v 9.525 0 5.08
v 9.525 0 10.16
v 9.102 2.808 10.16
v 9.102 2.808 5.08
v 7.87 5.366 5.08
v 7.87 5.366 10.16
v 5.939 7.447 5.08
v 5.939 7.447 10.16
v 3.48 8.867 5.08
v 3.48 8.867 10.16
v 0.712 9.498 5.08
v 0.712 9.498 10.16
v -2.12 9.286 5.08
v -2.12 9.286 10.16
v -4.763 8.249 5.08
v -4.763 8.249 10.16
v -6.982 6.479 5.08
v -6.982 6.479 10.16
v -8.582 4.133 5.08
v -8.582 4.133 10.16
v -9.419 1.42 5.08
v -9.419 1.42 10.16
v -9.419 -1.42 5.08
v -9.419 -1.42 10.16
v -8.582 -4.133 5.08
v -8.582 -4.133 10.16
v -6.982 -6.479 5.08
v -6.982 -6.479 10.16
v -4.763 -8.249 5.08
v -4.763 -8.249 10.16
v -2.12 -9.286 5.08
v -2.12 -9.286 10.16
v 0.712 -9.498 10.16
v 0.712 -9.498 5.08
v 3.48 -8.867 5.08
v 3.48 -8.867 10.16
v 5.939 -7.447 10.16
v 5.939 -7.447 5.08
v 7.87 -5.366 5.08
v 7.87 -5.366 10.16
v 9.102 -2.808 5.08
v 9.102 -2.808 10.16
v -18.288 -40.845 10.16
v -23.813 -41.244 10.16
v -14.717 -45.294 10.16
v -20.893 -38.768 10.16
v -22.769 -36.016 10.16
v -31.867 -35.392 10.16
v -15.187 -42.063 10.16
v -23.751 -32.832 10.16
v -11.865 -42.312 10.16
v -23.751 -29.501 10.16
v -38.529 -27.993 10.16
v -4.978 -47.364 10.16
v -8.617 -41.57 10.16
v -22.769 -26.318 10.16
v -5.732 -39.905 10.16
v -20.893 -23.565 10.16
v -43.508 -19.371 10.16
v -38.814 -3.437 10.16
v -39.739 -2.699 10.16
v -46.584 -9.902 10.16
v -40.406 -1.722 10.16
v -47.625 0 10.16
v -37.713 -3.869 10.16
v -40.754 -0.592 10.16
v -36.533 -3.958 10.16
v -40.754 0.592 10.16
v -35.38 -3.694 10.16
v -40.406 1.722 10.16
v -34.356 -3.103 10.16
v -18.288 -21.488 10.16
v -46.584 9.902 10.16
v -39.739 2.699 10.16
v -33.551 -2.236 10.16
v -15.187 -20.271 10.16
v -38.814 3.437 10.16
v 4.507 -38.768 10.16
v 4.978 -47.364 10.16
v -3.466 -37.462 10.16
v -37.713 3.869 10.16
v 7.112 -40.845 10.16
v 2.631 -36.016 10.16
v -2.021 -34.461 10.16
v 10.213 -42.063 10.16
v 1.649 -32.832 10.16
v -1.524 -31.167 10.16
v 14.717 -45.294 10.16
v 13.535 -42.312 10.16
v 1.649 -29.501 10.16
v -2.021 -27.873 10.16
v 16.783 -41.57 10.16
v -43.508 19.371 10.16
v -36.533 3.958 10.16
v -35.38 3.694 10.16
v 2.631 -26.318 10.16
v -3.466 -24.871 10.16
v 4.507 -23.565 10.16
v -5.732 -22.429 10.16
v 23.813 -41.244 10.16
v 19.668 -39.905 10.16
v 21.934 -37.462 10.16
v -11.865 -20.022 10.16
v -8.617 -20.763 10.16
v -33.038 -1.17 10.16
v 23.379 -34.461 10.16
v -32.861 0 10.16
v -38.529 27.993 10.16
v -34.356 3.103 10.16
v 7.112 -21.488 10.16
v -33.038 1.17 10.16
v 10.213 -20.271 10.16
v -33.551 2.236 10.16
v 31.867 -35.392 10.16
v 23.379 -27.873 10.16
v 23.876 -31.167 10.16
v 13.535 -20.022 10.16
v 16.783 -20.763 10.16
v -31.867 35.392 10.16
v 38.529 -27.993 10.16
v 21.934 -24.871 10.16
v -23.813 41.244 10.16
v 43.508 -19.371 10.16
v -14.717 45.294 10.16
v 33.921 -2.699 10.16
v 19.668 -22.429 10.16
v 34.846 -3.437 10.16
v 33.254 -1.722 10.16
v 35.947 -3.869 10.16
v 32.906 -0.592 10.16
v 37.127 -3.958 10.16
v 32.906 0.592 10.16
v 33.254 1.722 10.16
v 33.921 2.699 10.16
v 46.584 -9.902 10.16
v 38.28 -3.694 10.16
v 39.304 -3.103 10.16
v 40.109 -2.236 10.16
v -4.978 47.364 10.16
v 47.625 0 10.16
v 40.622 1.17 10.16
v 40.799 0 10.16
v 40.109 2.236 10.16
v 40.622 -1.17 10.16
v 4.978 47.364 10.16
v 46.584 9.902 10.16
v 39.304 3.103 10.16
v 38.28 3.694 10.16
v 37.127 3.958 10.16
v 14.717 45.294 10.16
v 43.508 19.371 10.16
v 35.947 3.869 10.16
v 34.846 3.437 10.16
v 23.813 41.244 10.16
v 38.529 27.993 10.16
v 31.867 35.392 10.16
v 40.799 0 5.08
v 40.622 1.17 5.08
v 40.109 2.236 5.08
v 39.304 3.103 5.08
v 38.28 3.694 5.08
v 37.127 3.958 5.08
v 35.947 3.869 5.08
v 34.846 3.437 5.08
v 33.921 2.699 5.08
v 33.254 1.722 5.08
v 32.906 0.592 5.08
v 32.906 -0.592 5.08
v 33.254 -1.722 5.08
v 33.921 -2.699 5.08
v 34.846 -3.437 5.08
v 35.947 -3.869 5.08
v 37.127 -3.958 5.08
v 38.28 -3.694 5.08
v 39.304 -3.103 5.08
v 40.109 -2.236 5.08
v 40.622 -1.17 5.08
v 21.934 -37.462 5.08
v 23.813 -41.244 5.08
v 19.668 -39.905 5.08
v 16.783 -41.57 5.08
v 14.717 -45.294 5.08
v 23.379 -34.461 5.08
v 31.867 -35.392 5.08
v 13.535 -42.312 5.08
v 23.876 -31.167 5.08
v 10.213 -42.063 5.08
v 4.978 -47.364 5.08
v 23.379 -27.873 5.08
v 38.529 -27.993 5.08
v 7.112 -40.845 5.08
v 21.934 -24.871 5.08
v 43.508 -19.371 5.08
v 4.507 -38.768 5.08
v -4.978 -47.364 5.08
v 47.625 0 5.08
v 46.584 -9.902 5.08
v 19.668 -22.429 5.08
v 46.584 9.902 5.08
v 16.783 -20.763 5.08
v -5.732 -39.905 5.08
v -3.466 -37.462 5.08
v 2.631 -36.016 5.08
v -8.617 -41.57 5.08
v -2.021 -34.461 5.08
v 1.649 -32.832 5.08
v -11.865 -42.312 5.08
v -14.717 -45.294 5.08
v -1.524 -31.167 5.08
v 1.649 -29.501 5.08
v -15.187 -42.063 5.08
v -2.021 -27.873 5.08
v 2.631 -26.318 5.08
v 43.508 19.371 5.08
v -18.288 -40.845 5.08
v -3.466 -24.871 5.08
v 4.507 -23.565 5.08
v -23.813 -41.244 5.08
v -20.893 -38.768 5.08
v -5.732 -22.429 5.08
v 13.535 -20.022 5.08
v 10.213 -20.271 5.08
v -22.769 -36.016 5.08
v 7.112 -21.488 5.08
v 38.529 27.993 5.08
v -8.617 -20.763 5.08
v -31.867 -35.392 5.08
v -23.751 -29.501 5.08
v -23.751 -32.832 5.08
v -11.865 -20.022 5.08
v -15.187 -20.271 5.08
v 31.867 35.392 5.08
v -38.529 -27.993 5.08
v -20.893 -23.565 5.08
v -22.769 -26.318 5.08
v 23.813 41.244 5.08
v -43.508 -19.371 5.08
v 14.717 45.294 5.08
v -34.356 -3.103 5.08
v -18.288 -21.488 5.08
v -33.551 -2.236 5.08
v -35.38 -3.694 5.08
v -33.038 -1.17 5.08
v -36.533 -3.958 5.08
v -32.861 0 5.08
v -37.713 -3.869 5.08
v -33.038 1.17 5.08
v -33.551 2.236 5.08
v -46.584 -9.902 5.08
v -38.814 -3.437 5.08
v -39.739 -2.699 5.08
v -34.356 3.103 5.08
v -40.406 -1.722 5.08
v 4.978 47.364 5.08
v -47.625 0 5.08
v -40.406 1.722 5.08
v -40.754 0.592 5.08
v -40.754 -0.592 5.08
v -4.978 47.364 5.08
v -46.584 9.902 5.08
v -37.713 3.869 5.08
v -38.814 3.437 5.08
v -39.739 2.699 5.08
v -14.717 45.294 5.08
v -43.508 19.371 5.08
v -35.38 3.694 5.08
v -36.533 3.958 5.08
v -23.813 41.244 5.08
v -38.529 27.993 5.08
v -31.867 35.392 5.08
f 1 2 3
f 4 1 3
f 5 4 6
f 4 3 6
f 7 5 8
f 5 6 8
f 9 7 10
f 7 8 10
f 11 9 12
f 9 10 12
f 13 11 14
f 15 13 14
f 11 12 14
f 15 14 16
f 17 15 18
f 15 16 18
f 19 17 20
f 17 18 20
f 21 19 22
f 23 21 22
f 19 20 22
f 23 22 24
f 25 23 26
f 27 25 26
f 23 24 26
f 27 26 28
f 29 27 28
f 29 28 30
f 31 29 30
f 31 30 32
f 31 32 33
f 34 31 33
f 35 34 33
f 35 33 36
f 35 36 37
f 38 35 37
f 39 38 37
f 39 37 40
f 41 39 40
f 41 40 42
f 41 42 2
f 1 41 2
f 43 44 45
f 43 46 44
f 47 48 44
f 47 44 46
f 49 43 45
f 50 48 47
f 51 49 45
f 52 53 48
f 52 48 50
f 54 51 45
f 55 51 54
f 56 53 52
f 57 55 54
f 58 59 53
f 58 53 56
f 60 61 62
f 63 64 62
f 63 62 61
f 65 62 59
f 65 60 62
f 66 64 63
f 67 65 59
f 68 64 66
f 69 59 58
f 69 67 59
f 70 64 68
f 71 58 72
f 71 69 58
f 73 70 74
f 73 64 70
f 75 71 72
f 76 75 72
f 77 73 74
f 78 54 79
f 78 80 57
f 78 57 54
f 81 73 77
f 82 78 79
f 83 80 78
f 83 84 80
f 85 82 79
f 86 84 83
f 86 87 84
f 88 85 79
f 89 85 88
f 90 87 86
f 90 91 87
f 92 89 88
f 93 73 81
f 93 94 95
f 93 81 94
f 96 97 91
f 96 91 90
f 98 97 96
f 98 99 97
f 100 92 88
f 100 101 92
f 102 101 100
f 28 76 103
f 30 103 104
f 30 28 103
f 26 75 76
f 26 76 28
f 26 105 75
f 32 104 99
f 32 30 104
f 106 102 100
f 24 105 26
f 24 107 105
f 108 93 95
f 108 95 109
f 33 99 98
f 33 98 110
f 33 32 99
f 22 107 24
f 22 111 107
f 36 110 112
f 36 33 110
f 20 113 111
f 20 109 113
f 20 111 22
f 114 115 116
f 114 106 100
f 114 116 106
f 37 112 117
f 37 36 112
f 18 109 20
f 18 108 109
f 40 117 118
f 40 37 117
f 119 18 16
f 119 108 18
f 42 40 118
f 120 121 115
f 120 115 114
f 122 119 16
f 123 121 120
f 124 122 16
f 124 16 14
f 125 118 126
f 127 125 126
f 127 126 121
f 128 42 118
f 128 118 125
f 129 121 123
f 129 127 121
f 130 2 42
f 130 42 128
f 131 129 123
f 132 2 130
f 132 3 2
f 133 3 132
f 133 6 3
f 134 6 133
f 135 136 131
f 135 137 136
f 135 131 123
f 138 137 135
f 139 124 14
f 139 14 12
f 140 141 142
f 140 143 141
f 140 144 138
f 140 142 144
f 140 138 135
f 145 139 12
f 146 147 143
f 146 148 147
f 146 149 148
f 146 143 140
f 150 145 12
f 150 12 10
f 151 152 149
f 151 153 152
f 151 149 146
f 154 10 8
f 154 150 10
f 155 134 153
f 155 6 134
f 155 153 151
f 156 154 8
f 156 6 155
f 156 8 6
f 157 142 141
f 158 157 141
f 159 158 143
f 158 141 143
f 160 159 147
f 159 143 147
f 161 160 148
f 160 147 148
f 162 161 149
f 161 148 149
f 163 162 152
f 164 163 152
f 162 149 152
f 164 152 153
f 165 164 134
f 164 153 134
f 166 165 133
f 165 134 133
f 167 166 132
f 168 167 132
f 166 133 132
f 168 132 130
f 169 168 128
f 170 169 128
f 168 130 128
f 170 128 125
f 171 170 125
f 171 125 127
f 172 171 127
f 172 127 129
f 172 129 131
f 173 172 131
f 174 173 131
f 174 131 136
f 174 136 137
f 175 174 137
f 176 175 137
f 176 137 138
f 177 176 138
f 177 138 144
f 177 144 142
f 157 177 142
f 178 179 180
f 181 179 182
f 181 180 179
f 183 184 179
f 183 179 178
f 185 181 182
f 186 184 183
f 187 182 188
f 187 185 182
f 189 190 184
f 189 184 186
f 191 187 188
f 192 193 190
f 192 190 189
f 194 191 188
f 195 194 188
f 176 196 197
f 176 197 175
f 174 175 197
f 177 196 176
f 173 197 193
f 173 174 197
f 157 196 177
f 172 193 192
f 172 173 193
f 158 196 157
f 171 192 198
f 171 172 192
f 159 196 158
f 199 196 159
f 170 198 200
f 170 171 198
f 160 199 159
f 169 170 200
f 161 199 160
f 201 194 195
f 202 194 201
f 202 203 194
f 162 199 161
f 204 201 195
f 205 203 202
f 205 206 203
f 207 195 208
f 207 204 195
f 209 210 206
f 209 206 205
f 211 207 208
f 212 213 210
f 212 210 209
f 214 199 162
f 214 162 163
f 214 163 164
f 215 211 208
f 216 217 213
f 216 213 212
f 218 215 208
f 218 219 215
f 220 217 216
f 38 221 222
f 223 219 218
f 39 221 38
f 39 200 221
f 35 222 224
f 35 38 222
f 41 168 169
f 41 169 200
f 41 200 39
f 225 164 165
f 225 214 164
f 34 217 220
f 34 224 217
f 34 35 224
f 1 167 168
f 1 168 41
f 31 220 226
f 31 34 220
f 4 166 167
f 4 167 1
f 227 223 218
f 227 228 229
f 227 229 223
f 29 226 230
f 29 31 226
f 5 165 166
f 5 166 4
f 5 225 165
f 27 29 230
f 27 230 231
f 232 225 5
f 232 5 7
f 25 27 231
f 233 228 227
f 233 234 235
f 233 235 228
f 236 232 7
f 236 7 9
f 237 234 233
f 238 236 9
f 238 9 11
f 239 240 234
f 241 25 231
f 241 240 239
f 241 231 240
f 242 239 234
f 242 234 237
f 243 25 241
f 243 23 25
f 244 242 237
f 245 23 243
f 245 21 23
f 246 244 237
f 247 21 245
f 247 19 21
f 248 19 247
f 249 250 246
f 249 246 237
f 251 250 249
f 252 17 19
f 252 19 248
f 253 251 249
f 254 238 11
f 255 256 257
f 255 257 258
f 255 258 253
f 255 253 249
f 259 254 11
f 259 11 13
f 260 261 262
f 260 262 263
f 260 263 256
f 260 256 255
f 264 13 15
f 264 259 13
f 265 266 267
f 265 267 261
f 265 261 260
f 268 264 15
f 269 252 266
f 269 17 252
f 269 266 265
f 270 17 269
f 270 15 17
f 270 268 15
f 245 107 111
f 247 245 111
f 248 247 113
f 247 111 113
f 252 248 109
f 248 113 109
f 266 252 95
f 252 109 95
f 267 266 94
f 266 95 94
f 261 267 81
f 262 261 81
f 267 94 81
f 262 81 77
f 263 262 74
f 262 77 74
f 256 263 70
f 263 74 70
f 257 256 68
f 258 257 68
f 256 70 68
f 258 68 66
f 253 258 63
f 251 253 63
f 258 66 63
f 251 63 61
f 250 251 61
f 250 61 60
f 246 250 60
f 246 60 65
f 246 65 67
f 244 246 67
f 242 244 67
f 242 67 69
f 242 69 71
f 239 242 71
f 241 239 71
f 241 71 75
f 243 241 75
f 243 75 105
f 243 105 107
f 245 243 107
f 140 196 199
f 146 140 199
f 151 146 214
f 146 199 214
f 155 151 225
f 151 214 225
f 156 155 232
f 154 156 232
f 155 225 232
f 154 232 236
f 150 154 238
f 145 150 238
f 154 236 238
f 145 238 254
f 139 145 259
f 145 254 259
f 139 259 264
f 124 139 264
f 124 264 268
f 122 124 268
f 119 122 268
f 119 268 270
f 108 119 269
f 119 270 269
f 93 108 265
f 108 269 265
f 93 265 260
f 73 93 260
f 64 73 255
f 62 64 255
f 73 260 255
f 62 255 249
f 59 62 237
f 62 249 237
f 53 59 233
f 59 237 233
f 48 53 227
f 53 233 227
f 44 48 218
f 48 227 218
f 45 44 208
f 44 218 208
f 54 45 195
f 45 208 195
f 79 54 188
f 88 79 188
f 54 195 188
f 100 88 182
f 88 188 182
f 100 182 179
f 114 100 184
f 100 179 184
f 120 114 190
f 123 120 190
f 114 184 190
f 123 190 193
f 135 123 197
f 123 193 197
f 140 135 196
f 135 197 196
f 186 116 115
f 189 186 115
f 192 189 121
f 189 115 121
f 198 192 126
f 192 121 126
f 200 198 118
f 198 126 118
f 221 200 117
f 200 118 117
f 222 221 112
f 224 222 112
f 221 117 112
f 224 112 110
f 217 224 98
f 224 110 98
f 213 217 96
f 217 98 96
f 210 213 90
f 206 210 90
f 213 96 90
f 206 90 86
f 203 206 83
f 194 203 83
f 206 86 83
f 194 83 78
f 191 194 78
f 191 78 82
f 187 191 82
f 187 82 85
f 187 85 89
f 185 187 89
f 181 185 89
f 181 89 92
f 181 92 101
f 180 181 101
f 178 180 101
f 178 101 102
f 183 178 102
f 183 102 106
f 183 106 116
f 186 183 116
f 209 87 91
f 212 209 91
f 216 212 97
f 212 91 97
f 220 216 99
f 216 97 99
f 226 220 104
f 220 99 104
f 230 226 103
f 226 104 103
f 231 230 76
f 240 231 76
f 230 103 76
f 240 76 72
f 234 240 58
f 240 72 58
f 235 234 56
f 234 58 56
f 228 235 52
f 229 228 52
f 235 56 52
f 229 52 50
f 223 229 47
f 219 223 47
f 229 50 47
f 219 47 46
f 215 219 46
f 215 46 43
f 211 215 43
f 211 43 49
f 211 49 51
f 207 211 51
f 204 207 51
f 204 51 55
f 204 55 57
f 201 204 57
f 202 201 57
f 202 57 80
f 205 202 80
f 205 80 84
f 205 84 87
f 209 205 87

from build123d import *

# Parameters (mm, degrees)
SKETCH1_R           = 49.5046
BOSS_EXTRUDE1_DEPTH = 5.08
SKETCH2_R           = 47.625
BOSS_EXTRUDE2_DEPTH = 5.08
SKETCH3_R           = 11.176
SKETCH3_R_2         = 3.96875
SKETCH3_R_3         = 9.525
CUT_EXTRUDE1_DEPTH  = 11.16
SKETCH7_R           = 65.421404769
CUT_EXTRUDE3_DEPTH  = 5.08


with BuildPart() as part:
    # Sketch1 → Boss-Extrude1 (new body)
    with BuildSketch(Plane.XY):
        Circle(SKETCH1_R)
    extrude(amount=BOSS_EXTRUDE1_DEPTH)

    # Sketch2 → Boss-Extrude2 (add)
    with BuildSketch(Plane.XY.offset(5.08)):
        Circle(SKETCH2_R)
    extrude(amount=BOSS_EXTRUDE2_DEPTH)

    # Sketch3 → Cut-Extrude1 (cut, through all)
    with BuildSketch(Plane.XY.offset(10.16)):
        with Locations((-12.7, -31.166793627)):
            Circle(SKETCH3_R)
        with Locations((12.7, -31.166793627)):
            Circle(SKETCH3_R)
        with Locations((-36.83, 0)):
            Circle(SKETCH3_R_2)
        with Locations((36.83, 0)):
            Circle(SKETCH3_R_2)
        Circle(SKETCH3_R_3)
    extrude(amount=-CUT_EXTRUDE1_DEPTH, mode=Mode.SUBTRACT)

    # Sketch7 → Cut-Extrude3 (cut)
    with BuildSketch(Plane(origin=(0, 0, 0), x_dir=(-1, 0, 0), z_dir=(0, 0, -1))):
        Circle(SKETCH7_R)
    extrude(amount=-CUT_EXTRUDE3_DEPTH, mode=Mode.SUBTRACT)


solid = part.part
